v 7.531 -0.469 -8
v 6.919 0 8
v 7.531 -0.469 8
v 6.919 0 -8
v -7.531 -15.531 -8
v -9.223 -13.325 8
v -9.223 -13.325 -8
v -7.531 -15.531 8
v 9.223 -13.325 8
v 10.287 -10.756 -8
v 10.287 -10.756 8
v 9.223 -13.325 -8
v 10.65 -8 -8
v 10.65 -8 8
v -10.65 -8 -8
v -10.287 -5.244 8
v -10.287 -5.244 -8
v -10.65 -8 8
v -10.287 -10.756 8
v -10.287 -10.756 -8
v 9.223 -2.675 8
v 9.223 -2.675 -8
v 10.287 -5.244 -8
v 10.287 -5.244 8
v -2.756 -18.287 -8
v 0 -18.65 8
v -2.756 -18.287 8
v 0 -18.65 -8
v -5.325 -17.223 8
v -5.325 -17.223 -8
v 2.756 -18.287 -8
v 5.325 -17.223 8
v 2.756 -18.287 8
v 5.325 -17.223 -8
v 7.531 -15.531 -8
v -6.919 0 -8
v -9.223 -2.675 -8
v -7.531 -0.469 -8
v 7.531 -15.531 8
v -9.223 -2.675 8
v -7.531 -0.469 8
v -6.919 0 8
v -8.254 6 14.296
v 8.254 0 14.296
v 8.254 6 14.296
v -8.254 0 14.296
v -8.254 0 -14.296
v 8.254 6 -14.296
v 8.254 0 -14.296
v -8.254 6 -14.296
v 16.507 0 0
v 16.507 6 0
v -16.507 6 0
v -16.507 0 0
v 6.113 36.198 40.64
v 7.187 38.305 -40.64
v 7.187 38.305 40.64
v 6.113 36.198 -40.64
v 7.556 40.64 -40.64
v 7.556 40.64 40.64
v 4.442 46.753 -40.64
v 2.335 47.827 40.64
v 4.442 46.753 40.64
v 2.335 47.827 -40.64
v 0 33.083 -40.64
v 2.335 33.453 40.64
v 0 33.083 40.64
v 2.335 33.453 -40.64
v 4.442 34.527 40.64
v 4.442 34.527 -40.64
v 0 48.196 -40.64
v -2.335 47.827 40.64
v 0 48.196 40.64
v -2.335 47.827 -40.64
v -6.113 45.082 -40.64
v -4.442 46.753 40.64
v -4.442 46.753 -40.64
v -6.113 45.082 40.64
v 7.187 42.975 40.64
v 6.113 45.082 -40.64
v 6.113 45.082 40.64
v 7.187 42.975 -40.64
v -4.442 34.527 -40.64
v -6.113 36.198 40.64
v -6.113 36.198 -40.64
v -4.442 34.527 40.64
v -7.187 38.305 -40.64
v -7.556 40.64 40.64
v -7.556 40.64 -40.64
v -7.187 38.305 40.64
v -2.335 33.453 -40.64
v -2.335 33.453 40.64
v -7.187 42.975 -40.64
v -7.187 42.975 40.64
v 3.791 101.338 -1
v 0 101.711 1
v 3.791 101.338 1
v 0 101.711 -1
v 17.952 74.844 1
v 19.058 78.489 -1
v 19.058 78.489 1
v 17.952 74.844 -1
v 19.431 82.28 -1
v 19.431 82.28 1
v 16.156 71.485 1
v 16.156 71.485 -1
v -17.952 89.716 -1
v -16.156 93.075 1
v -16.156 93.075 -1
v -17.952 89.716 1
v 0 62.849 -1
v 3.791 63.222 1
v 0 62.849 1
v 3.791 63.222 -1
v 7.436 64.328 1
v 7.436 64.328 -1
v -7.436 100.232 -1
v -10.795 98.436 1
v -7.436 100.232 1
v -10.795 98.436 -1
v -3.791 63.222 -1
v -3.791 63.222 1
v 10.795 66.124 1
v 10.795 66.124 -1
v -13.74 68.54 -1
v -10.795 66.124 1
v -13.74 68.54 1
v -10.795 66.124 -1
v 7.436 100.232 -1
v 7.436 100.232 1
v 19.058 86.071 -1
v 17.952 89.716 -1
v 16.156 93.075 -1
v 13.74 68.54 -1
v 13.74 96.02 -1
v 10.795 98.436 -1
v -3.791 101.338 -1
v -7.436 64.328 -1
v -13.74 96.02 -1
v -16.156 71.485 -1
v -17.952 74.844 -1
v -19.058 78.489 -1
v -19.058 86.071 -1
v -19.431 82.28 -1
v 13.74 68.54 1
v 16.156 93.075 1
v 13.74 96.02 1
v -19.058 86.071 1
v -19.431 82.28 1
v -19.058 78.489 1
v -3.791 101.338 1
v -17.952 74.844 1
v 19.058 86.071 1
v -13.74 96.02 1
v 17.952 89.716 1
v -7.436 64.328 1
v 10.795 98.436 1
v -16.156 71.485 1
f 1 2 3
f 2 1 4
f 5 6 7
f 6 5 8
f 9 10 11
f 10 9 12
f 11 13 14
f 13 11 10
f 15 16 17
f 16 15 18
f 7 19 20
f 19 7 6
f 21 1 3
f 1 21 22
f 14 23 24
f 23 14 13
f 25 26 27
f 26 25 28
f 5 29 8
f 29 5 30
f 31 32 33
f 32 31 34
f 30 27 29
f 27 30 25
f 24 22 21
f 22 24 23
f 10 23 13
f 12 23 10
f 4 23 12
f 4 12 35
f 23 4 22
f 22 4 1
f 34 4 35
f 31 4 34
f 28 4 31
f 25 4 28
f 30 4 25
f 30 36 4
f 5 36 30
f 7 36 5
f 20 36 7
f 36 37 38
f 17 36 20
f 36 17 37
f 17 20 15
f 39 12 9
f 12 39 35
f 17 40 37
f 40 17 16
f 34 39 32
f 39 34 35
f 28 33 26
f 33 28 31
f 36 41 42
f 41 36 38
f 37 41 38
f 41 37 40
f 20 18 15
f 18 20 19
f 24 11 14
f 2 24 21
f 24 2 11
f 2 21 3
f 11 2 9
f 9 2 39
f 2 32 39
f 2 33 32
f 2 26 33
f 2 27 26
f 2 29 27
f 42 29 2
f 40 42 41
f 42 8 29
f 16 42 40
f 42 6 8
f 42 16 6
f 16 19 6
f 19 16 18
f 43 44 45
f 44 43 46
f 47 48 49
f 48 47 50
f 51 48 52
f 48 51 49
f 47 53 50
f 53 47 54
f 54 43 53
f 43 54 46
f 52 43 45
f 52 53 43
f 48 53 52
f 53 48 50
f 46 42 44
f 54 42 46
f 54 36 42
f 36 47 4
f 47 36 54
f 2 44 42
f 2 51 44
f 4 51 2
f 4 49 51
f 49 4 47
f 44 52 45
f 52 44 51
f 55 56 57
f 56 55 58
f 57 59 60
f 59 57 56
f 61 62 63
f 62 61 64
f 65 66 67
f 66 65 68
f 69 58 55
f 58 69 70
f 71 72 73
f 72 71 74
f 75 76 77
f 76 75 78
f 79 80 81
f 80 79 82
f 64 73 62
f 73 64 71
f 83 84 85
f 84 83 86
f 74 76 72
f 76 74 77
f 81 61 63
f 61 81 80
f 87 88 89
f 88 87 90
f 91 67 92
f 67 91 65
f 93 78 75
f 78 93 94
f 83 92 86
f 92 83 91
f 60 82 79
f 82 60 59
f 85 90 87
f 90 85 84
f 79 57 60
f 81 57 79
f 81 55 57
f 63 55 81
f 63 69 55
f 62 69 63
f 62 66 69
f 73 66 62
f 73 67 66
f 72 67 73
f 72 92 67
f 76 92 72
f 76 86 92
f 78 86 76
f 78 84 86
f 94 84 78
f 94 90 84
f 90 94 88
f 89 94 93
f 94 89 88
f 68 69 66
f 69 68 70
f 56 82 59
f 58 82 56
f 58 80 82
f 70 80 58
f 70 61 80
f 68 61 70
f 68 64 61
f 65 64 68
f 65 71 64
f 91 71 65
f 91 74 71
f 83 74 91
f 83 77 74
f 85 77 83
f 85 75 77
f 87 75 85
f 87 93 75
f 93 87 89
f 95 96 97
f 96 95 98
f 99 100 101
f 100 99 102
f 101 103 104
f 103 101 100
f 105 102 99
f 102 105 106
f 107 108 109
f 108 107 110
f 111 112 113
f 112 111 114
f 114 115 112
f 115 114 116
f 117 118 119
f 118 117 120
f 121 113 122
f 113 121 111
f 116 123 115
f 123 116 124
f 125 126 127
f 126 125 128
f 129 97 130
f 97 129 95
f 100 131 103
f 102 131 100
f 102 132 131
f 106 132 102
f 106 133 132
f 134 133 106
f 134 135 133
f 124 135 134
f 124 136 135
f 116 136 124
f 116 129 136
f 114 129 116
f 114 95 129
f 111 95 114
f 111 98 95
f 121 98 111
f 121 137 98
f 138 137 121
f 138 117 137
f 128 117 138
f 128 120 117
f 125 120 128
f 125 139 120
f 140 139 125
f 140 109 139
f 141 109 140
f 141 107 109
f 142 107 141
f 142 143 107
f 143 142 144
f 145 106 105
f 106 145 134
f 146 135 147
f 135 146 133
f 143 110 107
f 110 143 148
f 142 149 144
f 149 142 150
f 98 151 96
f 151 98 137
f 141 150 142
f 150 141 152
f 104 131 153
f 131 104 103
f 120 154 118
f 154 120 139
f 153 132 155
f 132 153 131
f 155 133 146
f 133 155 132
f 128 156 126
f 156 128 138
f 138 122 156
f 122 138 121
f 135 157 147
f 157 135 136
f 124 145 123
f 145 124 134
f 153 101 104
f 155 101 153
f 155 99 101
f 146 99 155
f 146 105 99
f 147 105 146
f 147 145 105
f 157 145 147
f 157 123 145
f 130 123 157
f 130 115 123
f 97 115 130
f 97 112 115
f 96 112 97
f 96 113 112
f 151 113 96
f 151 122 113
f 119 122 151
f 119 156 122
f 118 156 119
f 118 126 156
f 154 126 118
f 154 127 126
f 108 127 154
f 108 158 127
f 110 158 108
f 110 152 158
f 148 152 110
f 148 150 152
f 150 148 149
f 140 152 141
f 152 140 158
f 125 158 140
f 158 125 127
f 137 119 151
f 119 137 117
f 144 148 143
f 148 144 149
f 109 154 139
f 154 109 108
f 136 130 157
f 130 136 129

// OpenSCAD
// Auto-generated by scripts/author_from_manifest.py (Phase D.3).
// Source: data/phase_d_manifest.json (sku_intent='viking-vk530-esfr-upright-k252-165f').
// Do not hand-edit — regenerate from the manifest.
//
// @part viking_vk530_esfr_upright_k252_165f
// @kind sprinkler_head
// @category head.upright.k252
// @display-name "Viking VK530 ESFR Upright K25.2 165°F"
// @mfg viking_group
// @mfg-pn VK530
// @listing UL FM
// @hazard-classes ESFR
// @price-usd 88.00
// @install-minutes 14
// @crew journeyman
// @k-factor 25.2
// @orientation upright
// @response quick
// @temperature 165F
// @param size_in number default=0.5 label="Size" unit="in"
// @port inlet position=[0,0.014,0] direction=[0,1,0] style=NPT_threaded size_in=1 role=drop

size_in = 0.5;
k_factor = 25.2;

length_mm   = 81.28;
body_dia_mm = 43.18;
thread_od   = 21.3;
thread_len  = 16;
deflector_d = body_dia_mm * 0.9;

rotate([180,0,0]) union() {
    translate([0, thread_len/2, 0])
        cylinder(h = thread_len, d = thread_od, center = true, $fn = 24);
    translate([0, -3, 0])
        rotate([90, 0, 0])
        cylinder(h = 6, d = thread_od * 1.55, $fn = 6, center = true);
    translate([0, -length_mm/2, 0])
        cylinder(h = length_mm, d = body_dia_mm * 0.35, center = true, $fn = 20);
    translate([0, -length_mm - 1, 0])
        cylinder(h = 2, d = deflector_d, center = true, $fn = 32);
}
